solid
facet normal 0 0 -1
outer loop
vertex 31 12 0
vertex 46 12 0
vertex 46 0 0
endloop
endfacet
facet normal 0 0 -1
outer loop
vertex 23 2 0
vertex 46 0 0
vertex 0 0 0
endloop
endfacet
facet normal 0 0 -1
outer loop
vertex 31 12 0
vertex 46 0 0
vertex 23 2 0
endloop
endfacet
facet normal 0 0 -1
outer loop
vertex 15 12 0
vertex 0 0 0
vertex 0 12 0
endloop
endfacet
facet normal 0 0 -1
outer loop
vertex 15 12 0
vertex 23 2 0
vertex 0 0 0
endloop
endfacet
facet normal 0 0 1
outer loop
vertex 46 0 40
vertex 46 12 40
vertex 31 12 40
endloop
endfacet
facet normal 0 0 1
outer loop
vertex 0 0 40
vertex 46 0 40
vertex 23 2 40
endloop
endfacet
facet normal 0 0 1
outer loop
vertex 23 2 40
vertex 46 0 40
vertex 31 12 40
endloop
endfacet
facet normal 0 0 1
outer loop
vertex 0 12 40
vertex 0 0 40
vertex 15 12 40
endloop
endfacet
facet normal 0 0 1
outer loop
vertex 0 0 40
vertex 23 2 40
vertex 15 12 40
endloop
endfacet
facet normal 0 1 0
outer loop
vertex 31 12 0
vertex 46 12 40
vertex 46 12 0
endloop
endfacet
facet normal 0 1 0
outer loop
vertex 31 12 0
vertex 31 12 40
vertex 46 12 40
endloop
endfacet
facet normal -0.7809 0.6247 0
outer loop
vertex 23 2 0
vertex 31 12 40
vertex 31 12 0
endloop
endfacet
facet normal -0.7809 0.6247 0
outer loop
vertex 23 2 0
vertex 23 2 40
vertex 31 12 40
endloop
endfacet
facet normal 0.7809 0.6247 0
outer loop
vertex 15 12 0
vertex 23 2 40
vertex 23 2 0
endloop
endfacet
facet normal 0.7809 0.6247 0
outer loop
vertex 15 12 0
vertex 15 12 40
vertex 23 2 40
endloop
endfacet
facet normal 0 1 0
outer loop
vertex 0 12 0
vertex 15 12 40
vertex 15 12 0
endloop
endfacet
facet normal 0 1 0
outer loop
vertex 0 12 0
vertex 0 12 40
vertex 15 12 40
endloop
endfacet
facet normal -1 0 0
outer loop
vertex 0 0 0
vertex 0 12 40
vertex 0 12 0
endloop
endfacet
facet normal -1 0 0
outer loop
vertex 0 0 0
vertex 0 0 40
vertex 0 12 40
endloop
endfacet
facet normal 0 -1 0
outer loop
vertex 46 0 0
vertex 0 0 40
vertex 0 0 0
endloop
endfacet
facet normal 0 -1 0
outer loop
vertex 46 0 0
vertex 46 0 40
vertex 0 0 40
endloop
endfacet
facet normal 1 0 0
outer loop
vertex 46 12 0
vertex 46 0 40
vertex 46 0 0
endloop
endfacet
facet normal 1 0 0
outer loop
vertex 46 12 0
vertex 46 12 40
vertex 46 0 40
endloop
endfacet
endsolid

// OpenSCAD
$fn = 32;

// ----------------------------------------------------------------------
// V guide rail: vway, 46 mm wide
// ----------------------------------------------------------------------

// --- parameters (mm) ---
rail_w = 46;              // rail width, X
base_t = 12;              // base plate thickness
v_depth = 10;             // V feature depth / height
v_half_w = 8;             // half width of the V at the base face
plate_t = 40;             // rail length, Z (the extrusion height)

profile = [[0, 0], [46, 0], [46, 12], [31, 12], [23, 2], [15, 12], [0, 12]];  // primary outline, 7 points, counter clockwise

// --- the one profile operation ---
linear_extrude(height = plate_t) polygon(points = profile);
